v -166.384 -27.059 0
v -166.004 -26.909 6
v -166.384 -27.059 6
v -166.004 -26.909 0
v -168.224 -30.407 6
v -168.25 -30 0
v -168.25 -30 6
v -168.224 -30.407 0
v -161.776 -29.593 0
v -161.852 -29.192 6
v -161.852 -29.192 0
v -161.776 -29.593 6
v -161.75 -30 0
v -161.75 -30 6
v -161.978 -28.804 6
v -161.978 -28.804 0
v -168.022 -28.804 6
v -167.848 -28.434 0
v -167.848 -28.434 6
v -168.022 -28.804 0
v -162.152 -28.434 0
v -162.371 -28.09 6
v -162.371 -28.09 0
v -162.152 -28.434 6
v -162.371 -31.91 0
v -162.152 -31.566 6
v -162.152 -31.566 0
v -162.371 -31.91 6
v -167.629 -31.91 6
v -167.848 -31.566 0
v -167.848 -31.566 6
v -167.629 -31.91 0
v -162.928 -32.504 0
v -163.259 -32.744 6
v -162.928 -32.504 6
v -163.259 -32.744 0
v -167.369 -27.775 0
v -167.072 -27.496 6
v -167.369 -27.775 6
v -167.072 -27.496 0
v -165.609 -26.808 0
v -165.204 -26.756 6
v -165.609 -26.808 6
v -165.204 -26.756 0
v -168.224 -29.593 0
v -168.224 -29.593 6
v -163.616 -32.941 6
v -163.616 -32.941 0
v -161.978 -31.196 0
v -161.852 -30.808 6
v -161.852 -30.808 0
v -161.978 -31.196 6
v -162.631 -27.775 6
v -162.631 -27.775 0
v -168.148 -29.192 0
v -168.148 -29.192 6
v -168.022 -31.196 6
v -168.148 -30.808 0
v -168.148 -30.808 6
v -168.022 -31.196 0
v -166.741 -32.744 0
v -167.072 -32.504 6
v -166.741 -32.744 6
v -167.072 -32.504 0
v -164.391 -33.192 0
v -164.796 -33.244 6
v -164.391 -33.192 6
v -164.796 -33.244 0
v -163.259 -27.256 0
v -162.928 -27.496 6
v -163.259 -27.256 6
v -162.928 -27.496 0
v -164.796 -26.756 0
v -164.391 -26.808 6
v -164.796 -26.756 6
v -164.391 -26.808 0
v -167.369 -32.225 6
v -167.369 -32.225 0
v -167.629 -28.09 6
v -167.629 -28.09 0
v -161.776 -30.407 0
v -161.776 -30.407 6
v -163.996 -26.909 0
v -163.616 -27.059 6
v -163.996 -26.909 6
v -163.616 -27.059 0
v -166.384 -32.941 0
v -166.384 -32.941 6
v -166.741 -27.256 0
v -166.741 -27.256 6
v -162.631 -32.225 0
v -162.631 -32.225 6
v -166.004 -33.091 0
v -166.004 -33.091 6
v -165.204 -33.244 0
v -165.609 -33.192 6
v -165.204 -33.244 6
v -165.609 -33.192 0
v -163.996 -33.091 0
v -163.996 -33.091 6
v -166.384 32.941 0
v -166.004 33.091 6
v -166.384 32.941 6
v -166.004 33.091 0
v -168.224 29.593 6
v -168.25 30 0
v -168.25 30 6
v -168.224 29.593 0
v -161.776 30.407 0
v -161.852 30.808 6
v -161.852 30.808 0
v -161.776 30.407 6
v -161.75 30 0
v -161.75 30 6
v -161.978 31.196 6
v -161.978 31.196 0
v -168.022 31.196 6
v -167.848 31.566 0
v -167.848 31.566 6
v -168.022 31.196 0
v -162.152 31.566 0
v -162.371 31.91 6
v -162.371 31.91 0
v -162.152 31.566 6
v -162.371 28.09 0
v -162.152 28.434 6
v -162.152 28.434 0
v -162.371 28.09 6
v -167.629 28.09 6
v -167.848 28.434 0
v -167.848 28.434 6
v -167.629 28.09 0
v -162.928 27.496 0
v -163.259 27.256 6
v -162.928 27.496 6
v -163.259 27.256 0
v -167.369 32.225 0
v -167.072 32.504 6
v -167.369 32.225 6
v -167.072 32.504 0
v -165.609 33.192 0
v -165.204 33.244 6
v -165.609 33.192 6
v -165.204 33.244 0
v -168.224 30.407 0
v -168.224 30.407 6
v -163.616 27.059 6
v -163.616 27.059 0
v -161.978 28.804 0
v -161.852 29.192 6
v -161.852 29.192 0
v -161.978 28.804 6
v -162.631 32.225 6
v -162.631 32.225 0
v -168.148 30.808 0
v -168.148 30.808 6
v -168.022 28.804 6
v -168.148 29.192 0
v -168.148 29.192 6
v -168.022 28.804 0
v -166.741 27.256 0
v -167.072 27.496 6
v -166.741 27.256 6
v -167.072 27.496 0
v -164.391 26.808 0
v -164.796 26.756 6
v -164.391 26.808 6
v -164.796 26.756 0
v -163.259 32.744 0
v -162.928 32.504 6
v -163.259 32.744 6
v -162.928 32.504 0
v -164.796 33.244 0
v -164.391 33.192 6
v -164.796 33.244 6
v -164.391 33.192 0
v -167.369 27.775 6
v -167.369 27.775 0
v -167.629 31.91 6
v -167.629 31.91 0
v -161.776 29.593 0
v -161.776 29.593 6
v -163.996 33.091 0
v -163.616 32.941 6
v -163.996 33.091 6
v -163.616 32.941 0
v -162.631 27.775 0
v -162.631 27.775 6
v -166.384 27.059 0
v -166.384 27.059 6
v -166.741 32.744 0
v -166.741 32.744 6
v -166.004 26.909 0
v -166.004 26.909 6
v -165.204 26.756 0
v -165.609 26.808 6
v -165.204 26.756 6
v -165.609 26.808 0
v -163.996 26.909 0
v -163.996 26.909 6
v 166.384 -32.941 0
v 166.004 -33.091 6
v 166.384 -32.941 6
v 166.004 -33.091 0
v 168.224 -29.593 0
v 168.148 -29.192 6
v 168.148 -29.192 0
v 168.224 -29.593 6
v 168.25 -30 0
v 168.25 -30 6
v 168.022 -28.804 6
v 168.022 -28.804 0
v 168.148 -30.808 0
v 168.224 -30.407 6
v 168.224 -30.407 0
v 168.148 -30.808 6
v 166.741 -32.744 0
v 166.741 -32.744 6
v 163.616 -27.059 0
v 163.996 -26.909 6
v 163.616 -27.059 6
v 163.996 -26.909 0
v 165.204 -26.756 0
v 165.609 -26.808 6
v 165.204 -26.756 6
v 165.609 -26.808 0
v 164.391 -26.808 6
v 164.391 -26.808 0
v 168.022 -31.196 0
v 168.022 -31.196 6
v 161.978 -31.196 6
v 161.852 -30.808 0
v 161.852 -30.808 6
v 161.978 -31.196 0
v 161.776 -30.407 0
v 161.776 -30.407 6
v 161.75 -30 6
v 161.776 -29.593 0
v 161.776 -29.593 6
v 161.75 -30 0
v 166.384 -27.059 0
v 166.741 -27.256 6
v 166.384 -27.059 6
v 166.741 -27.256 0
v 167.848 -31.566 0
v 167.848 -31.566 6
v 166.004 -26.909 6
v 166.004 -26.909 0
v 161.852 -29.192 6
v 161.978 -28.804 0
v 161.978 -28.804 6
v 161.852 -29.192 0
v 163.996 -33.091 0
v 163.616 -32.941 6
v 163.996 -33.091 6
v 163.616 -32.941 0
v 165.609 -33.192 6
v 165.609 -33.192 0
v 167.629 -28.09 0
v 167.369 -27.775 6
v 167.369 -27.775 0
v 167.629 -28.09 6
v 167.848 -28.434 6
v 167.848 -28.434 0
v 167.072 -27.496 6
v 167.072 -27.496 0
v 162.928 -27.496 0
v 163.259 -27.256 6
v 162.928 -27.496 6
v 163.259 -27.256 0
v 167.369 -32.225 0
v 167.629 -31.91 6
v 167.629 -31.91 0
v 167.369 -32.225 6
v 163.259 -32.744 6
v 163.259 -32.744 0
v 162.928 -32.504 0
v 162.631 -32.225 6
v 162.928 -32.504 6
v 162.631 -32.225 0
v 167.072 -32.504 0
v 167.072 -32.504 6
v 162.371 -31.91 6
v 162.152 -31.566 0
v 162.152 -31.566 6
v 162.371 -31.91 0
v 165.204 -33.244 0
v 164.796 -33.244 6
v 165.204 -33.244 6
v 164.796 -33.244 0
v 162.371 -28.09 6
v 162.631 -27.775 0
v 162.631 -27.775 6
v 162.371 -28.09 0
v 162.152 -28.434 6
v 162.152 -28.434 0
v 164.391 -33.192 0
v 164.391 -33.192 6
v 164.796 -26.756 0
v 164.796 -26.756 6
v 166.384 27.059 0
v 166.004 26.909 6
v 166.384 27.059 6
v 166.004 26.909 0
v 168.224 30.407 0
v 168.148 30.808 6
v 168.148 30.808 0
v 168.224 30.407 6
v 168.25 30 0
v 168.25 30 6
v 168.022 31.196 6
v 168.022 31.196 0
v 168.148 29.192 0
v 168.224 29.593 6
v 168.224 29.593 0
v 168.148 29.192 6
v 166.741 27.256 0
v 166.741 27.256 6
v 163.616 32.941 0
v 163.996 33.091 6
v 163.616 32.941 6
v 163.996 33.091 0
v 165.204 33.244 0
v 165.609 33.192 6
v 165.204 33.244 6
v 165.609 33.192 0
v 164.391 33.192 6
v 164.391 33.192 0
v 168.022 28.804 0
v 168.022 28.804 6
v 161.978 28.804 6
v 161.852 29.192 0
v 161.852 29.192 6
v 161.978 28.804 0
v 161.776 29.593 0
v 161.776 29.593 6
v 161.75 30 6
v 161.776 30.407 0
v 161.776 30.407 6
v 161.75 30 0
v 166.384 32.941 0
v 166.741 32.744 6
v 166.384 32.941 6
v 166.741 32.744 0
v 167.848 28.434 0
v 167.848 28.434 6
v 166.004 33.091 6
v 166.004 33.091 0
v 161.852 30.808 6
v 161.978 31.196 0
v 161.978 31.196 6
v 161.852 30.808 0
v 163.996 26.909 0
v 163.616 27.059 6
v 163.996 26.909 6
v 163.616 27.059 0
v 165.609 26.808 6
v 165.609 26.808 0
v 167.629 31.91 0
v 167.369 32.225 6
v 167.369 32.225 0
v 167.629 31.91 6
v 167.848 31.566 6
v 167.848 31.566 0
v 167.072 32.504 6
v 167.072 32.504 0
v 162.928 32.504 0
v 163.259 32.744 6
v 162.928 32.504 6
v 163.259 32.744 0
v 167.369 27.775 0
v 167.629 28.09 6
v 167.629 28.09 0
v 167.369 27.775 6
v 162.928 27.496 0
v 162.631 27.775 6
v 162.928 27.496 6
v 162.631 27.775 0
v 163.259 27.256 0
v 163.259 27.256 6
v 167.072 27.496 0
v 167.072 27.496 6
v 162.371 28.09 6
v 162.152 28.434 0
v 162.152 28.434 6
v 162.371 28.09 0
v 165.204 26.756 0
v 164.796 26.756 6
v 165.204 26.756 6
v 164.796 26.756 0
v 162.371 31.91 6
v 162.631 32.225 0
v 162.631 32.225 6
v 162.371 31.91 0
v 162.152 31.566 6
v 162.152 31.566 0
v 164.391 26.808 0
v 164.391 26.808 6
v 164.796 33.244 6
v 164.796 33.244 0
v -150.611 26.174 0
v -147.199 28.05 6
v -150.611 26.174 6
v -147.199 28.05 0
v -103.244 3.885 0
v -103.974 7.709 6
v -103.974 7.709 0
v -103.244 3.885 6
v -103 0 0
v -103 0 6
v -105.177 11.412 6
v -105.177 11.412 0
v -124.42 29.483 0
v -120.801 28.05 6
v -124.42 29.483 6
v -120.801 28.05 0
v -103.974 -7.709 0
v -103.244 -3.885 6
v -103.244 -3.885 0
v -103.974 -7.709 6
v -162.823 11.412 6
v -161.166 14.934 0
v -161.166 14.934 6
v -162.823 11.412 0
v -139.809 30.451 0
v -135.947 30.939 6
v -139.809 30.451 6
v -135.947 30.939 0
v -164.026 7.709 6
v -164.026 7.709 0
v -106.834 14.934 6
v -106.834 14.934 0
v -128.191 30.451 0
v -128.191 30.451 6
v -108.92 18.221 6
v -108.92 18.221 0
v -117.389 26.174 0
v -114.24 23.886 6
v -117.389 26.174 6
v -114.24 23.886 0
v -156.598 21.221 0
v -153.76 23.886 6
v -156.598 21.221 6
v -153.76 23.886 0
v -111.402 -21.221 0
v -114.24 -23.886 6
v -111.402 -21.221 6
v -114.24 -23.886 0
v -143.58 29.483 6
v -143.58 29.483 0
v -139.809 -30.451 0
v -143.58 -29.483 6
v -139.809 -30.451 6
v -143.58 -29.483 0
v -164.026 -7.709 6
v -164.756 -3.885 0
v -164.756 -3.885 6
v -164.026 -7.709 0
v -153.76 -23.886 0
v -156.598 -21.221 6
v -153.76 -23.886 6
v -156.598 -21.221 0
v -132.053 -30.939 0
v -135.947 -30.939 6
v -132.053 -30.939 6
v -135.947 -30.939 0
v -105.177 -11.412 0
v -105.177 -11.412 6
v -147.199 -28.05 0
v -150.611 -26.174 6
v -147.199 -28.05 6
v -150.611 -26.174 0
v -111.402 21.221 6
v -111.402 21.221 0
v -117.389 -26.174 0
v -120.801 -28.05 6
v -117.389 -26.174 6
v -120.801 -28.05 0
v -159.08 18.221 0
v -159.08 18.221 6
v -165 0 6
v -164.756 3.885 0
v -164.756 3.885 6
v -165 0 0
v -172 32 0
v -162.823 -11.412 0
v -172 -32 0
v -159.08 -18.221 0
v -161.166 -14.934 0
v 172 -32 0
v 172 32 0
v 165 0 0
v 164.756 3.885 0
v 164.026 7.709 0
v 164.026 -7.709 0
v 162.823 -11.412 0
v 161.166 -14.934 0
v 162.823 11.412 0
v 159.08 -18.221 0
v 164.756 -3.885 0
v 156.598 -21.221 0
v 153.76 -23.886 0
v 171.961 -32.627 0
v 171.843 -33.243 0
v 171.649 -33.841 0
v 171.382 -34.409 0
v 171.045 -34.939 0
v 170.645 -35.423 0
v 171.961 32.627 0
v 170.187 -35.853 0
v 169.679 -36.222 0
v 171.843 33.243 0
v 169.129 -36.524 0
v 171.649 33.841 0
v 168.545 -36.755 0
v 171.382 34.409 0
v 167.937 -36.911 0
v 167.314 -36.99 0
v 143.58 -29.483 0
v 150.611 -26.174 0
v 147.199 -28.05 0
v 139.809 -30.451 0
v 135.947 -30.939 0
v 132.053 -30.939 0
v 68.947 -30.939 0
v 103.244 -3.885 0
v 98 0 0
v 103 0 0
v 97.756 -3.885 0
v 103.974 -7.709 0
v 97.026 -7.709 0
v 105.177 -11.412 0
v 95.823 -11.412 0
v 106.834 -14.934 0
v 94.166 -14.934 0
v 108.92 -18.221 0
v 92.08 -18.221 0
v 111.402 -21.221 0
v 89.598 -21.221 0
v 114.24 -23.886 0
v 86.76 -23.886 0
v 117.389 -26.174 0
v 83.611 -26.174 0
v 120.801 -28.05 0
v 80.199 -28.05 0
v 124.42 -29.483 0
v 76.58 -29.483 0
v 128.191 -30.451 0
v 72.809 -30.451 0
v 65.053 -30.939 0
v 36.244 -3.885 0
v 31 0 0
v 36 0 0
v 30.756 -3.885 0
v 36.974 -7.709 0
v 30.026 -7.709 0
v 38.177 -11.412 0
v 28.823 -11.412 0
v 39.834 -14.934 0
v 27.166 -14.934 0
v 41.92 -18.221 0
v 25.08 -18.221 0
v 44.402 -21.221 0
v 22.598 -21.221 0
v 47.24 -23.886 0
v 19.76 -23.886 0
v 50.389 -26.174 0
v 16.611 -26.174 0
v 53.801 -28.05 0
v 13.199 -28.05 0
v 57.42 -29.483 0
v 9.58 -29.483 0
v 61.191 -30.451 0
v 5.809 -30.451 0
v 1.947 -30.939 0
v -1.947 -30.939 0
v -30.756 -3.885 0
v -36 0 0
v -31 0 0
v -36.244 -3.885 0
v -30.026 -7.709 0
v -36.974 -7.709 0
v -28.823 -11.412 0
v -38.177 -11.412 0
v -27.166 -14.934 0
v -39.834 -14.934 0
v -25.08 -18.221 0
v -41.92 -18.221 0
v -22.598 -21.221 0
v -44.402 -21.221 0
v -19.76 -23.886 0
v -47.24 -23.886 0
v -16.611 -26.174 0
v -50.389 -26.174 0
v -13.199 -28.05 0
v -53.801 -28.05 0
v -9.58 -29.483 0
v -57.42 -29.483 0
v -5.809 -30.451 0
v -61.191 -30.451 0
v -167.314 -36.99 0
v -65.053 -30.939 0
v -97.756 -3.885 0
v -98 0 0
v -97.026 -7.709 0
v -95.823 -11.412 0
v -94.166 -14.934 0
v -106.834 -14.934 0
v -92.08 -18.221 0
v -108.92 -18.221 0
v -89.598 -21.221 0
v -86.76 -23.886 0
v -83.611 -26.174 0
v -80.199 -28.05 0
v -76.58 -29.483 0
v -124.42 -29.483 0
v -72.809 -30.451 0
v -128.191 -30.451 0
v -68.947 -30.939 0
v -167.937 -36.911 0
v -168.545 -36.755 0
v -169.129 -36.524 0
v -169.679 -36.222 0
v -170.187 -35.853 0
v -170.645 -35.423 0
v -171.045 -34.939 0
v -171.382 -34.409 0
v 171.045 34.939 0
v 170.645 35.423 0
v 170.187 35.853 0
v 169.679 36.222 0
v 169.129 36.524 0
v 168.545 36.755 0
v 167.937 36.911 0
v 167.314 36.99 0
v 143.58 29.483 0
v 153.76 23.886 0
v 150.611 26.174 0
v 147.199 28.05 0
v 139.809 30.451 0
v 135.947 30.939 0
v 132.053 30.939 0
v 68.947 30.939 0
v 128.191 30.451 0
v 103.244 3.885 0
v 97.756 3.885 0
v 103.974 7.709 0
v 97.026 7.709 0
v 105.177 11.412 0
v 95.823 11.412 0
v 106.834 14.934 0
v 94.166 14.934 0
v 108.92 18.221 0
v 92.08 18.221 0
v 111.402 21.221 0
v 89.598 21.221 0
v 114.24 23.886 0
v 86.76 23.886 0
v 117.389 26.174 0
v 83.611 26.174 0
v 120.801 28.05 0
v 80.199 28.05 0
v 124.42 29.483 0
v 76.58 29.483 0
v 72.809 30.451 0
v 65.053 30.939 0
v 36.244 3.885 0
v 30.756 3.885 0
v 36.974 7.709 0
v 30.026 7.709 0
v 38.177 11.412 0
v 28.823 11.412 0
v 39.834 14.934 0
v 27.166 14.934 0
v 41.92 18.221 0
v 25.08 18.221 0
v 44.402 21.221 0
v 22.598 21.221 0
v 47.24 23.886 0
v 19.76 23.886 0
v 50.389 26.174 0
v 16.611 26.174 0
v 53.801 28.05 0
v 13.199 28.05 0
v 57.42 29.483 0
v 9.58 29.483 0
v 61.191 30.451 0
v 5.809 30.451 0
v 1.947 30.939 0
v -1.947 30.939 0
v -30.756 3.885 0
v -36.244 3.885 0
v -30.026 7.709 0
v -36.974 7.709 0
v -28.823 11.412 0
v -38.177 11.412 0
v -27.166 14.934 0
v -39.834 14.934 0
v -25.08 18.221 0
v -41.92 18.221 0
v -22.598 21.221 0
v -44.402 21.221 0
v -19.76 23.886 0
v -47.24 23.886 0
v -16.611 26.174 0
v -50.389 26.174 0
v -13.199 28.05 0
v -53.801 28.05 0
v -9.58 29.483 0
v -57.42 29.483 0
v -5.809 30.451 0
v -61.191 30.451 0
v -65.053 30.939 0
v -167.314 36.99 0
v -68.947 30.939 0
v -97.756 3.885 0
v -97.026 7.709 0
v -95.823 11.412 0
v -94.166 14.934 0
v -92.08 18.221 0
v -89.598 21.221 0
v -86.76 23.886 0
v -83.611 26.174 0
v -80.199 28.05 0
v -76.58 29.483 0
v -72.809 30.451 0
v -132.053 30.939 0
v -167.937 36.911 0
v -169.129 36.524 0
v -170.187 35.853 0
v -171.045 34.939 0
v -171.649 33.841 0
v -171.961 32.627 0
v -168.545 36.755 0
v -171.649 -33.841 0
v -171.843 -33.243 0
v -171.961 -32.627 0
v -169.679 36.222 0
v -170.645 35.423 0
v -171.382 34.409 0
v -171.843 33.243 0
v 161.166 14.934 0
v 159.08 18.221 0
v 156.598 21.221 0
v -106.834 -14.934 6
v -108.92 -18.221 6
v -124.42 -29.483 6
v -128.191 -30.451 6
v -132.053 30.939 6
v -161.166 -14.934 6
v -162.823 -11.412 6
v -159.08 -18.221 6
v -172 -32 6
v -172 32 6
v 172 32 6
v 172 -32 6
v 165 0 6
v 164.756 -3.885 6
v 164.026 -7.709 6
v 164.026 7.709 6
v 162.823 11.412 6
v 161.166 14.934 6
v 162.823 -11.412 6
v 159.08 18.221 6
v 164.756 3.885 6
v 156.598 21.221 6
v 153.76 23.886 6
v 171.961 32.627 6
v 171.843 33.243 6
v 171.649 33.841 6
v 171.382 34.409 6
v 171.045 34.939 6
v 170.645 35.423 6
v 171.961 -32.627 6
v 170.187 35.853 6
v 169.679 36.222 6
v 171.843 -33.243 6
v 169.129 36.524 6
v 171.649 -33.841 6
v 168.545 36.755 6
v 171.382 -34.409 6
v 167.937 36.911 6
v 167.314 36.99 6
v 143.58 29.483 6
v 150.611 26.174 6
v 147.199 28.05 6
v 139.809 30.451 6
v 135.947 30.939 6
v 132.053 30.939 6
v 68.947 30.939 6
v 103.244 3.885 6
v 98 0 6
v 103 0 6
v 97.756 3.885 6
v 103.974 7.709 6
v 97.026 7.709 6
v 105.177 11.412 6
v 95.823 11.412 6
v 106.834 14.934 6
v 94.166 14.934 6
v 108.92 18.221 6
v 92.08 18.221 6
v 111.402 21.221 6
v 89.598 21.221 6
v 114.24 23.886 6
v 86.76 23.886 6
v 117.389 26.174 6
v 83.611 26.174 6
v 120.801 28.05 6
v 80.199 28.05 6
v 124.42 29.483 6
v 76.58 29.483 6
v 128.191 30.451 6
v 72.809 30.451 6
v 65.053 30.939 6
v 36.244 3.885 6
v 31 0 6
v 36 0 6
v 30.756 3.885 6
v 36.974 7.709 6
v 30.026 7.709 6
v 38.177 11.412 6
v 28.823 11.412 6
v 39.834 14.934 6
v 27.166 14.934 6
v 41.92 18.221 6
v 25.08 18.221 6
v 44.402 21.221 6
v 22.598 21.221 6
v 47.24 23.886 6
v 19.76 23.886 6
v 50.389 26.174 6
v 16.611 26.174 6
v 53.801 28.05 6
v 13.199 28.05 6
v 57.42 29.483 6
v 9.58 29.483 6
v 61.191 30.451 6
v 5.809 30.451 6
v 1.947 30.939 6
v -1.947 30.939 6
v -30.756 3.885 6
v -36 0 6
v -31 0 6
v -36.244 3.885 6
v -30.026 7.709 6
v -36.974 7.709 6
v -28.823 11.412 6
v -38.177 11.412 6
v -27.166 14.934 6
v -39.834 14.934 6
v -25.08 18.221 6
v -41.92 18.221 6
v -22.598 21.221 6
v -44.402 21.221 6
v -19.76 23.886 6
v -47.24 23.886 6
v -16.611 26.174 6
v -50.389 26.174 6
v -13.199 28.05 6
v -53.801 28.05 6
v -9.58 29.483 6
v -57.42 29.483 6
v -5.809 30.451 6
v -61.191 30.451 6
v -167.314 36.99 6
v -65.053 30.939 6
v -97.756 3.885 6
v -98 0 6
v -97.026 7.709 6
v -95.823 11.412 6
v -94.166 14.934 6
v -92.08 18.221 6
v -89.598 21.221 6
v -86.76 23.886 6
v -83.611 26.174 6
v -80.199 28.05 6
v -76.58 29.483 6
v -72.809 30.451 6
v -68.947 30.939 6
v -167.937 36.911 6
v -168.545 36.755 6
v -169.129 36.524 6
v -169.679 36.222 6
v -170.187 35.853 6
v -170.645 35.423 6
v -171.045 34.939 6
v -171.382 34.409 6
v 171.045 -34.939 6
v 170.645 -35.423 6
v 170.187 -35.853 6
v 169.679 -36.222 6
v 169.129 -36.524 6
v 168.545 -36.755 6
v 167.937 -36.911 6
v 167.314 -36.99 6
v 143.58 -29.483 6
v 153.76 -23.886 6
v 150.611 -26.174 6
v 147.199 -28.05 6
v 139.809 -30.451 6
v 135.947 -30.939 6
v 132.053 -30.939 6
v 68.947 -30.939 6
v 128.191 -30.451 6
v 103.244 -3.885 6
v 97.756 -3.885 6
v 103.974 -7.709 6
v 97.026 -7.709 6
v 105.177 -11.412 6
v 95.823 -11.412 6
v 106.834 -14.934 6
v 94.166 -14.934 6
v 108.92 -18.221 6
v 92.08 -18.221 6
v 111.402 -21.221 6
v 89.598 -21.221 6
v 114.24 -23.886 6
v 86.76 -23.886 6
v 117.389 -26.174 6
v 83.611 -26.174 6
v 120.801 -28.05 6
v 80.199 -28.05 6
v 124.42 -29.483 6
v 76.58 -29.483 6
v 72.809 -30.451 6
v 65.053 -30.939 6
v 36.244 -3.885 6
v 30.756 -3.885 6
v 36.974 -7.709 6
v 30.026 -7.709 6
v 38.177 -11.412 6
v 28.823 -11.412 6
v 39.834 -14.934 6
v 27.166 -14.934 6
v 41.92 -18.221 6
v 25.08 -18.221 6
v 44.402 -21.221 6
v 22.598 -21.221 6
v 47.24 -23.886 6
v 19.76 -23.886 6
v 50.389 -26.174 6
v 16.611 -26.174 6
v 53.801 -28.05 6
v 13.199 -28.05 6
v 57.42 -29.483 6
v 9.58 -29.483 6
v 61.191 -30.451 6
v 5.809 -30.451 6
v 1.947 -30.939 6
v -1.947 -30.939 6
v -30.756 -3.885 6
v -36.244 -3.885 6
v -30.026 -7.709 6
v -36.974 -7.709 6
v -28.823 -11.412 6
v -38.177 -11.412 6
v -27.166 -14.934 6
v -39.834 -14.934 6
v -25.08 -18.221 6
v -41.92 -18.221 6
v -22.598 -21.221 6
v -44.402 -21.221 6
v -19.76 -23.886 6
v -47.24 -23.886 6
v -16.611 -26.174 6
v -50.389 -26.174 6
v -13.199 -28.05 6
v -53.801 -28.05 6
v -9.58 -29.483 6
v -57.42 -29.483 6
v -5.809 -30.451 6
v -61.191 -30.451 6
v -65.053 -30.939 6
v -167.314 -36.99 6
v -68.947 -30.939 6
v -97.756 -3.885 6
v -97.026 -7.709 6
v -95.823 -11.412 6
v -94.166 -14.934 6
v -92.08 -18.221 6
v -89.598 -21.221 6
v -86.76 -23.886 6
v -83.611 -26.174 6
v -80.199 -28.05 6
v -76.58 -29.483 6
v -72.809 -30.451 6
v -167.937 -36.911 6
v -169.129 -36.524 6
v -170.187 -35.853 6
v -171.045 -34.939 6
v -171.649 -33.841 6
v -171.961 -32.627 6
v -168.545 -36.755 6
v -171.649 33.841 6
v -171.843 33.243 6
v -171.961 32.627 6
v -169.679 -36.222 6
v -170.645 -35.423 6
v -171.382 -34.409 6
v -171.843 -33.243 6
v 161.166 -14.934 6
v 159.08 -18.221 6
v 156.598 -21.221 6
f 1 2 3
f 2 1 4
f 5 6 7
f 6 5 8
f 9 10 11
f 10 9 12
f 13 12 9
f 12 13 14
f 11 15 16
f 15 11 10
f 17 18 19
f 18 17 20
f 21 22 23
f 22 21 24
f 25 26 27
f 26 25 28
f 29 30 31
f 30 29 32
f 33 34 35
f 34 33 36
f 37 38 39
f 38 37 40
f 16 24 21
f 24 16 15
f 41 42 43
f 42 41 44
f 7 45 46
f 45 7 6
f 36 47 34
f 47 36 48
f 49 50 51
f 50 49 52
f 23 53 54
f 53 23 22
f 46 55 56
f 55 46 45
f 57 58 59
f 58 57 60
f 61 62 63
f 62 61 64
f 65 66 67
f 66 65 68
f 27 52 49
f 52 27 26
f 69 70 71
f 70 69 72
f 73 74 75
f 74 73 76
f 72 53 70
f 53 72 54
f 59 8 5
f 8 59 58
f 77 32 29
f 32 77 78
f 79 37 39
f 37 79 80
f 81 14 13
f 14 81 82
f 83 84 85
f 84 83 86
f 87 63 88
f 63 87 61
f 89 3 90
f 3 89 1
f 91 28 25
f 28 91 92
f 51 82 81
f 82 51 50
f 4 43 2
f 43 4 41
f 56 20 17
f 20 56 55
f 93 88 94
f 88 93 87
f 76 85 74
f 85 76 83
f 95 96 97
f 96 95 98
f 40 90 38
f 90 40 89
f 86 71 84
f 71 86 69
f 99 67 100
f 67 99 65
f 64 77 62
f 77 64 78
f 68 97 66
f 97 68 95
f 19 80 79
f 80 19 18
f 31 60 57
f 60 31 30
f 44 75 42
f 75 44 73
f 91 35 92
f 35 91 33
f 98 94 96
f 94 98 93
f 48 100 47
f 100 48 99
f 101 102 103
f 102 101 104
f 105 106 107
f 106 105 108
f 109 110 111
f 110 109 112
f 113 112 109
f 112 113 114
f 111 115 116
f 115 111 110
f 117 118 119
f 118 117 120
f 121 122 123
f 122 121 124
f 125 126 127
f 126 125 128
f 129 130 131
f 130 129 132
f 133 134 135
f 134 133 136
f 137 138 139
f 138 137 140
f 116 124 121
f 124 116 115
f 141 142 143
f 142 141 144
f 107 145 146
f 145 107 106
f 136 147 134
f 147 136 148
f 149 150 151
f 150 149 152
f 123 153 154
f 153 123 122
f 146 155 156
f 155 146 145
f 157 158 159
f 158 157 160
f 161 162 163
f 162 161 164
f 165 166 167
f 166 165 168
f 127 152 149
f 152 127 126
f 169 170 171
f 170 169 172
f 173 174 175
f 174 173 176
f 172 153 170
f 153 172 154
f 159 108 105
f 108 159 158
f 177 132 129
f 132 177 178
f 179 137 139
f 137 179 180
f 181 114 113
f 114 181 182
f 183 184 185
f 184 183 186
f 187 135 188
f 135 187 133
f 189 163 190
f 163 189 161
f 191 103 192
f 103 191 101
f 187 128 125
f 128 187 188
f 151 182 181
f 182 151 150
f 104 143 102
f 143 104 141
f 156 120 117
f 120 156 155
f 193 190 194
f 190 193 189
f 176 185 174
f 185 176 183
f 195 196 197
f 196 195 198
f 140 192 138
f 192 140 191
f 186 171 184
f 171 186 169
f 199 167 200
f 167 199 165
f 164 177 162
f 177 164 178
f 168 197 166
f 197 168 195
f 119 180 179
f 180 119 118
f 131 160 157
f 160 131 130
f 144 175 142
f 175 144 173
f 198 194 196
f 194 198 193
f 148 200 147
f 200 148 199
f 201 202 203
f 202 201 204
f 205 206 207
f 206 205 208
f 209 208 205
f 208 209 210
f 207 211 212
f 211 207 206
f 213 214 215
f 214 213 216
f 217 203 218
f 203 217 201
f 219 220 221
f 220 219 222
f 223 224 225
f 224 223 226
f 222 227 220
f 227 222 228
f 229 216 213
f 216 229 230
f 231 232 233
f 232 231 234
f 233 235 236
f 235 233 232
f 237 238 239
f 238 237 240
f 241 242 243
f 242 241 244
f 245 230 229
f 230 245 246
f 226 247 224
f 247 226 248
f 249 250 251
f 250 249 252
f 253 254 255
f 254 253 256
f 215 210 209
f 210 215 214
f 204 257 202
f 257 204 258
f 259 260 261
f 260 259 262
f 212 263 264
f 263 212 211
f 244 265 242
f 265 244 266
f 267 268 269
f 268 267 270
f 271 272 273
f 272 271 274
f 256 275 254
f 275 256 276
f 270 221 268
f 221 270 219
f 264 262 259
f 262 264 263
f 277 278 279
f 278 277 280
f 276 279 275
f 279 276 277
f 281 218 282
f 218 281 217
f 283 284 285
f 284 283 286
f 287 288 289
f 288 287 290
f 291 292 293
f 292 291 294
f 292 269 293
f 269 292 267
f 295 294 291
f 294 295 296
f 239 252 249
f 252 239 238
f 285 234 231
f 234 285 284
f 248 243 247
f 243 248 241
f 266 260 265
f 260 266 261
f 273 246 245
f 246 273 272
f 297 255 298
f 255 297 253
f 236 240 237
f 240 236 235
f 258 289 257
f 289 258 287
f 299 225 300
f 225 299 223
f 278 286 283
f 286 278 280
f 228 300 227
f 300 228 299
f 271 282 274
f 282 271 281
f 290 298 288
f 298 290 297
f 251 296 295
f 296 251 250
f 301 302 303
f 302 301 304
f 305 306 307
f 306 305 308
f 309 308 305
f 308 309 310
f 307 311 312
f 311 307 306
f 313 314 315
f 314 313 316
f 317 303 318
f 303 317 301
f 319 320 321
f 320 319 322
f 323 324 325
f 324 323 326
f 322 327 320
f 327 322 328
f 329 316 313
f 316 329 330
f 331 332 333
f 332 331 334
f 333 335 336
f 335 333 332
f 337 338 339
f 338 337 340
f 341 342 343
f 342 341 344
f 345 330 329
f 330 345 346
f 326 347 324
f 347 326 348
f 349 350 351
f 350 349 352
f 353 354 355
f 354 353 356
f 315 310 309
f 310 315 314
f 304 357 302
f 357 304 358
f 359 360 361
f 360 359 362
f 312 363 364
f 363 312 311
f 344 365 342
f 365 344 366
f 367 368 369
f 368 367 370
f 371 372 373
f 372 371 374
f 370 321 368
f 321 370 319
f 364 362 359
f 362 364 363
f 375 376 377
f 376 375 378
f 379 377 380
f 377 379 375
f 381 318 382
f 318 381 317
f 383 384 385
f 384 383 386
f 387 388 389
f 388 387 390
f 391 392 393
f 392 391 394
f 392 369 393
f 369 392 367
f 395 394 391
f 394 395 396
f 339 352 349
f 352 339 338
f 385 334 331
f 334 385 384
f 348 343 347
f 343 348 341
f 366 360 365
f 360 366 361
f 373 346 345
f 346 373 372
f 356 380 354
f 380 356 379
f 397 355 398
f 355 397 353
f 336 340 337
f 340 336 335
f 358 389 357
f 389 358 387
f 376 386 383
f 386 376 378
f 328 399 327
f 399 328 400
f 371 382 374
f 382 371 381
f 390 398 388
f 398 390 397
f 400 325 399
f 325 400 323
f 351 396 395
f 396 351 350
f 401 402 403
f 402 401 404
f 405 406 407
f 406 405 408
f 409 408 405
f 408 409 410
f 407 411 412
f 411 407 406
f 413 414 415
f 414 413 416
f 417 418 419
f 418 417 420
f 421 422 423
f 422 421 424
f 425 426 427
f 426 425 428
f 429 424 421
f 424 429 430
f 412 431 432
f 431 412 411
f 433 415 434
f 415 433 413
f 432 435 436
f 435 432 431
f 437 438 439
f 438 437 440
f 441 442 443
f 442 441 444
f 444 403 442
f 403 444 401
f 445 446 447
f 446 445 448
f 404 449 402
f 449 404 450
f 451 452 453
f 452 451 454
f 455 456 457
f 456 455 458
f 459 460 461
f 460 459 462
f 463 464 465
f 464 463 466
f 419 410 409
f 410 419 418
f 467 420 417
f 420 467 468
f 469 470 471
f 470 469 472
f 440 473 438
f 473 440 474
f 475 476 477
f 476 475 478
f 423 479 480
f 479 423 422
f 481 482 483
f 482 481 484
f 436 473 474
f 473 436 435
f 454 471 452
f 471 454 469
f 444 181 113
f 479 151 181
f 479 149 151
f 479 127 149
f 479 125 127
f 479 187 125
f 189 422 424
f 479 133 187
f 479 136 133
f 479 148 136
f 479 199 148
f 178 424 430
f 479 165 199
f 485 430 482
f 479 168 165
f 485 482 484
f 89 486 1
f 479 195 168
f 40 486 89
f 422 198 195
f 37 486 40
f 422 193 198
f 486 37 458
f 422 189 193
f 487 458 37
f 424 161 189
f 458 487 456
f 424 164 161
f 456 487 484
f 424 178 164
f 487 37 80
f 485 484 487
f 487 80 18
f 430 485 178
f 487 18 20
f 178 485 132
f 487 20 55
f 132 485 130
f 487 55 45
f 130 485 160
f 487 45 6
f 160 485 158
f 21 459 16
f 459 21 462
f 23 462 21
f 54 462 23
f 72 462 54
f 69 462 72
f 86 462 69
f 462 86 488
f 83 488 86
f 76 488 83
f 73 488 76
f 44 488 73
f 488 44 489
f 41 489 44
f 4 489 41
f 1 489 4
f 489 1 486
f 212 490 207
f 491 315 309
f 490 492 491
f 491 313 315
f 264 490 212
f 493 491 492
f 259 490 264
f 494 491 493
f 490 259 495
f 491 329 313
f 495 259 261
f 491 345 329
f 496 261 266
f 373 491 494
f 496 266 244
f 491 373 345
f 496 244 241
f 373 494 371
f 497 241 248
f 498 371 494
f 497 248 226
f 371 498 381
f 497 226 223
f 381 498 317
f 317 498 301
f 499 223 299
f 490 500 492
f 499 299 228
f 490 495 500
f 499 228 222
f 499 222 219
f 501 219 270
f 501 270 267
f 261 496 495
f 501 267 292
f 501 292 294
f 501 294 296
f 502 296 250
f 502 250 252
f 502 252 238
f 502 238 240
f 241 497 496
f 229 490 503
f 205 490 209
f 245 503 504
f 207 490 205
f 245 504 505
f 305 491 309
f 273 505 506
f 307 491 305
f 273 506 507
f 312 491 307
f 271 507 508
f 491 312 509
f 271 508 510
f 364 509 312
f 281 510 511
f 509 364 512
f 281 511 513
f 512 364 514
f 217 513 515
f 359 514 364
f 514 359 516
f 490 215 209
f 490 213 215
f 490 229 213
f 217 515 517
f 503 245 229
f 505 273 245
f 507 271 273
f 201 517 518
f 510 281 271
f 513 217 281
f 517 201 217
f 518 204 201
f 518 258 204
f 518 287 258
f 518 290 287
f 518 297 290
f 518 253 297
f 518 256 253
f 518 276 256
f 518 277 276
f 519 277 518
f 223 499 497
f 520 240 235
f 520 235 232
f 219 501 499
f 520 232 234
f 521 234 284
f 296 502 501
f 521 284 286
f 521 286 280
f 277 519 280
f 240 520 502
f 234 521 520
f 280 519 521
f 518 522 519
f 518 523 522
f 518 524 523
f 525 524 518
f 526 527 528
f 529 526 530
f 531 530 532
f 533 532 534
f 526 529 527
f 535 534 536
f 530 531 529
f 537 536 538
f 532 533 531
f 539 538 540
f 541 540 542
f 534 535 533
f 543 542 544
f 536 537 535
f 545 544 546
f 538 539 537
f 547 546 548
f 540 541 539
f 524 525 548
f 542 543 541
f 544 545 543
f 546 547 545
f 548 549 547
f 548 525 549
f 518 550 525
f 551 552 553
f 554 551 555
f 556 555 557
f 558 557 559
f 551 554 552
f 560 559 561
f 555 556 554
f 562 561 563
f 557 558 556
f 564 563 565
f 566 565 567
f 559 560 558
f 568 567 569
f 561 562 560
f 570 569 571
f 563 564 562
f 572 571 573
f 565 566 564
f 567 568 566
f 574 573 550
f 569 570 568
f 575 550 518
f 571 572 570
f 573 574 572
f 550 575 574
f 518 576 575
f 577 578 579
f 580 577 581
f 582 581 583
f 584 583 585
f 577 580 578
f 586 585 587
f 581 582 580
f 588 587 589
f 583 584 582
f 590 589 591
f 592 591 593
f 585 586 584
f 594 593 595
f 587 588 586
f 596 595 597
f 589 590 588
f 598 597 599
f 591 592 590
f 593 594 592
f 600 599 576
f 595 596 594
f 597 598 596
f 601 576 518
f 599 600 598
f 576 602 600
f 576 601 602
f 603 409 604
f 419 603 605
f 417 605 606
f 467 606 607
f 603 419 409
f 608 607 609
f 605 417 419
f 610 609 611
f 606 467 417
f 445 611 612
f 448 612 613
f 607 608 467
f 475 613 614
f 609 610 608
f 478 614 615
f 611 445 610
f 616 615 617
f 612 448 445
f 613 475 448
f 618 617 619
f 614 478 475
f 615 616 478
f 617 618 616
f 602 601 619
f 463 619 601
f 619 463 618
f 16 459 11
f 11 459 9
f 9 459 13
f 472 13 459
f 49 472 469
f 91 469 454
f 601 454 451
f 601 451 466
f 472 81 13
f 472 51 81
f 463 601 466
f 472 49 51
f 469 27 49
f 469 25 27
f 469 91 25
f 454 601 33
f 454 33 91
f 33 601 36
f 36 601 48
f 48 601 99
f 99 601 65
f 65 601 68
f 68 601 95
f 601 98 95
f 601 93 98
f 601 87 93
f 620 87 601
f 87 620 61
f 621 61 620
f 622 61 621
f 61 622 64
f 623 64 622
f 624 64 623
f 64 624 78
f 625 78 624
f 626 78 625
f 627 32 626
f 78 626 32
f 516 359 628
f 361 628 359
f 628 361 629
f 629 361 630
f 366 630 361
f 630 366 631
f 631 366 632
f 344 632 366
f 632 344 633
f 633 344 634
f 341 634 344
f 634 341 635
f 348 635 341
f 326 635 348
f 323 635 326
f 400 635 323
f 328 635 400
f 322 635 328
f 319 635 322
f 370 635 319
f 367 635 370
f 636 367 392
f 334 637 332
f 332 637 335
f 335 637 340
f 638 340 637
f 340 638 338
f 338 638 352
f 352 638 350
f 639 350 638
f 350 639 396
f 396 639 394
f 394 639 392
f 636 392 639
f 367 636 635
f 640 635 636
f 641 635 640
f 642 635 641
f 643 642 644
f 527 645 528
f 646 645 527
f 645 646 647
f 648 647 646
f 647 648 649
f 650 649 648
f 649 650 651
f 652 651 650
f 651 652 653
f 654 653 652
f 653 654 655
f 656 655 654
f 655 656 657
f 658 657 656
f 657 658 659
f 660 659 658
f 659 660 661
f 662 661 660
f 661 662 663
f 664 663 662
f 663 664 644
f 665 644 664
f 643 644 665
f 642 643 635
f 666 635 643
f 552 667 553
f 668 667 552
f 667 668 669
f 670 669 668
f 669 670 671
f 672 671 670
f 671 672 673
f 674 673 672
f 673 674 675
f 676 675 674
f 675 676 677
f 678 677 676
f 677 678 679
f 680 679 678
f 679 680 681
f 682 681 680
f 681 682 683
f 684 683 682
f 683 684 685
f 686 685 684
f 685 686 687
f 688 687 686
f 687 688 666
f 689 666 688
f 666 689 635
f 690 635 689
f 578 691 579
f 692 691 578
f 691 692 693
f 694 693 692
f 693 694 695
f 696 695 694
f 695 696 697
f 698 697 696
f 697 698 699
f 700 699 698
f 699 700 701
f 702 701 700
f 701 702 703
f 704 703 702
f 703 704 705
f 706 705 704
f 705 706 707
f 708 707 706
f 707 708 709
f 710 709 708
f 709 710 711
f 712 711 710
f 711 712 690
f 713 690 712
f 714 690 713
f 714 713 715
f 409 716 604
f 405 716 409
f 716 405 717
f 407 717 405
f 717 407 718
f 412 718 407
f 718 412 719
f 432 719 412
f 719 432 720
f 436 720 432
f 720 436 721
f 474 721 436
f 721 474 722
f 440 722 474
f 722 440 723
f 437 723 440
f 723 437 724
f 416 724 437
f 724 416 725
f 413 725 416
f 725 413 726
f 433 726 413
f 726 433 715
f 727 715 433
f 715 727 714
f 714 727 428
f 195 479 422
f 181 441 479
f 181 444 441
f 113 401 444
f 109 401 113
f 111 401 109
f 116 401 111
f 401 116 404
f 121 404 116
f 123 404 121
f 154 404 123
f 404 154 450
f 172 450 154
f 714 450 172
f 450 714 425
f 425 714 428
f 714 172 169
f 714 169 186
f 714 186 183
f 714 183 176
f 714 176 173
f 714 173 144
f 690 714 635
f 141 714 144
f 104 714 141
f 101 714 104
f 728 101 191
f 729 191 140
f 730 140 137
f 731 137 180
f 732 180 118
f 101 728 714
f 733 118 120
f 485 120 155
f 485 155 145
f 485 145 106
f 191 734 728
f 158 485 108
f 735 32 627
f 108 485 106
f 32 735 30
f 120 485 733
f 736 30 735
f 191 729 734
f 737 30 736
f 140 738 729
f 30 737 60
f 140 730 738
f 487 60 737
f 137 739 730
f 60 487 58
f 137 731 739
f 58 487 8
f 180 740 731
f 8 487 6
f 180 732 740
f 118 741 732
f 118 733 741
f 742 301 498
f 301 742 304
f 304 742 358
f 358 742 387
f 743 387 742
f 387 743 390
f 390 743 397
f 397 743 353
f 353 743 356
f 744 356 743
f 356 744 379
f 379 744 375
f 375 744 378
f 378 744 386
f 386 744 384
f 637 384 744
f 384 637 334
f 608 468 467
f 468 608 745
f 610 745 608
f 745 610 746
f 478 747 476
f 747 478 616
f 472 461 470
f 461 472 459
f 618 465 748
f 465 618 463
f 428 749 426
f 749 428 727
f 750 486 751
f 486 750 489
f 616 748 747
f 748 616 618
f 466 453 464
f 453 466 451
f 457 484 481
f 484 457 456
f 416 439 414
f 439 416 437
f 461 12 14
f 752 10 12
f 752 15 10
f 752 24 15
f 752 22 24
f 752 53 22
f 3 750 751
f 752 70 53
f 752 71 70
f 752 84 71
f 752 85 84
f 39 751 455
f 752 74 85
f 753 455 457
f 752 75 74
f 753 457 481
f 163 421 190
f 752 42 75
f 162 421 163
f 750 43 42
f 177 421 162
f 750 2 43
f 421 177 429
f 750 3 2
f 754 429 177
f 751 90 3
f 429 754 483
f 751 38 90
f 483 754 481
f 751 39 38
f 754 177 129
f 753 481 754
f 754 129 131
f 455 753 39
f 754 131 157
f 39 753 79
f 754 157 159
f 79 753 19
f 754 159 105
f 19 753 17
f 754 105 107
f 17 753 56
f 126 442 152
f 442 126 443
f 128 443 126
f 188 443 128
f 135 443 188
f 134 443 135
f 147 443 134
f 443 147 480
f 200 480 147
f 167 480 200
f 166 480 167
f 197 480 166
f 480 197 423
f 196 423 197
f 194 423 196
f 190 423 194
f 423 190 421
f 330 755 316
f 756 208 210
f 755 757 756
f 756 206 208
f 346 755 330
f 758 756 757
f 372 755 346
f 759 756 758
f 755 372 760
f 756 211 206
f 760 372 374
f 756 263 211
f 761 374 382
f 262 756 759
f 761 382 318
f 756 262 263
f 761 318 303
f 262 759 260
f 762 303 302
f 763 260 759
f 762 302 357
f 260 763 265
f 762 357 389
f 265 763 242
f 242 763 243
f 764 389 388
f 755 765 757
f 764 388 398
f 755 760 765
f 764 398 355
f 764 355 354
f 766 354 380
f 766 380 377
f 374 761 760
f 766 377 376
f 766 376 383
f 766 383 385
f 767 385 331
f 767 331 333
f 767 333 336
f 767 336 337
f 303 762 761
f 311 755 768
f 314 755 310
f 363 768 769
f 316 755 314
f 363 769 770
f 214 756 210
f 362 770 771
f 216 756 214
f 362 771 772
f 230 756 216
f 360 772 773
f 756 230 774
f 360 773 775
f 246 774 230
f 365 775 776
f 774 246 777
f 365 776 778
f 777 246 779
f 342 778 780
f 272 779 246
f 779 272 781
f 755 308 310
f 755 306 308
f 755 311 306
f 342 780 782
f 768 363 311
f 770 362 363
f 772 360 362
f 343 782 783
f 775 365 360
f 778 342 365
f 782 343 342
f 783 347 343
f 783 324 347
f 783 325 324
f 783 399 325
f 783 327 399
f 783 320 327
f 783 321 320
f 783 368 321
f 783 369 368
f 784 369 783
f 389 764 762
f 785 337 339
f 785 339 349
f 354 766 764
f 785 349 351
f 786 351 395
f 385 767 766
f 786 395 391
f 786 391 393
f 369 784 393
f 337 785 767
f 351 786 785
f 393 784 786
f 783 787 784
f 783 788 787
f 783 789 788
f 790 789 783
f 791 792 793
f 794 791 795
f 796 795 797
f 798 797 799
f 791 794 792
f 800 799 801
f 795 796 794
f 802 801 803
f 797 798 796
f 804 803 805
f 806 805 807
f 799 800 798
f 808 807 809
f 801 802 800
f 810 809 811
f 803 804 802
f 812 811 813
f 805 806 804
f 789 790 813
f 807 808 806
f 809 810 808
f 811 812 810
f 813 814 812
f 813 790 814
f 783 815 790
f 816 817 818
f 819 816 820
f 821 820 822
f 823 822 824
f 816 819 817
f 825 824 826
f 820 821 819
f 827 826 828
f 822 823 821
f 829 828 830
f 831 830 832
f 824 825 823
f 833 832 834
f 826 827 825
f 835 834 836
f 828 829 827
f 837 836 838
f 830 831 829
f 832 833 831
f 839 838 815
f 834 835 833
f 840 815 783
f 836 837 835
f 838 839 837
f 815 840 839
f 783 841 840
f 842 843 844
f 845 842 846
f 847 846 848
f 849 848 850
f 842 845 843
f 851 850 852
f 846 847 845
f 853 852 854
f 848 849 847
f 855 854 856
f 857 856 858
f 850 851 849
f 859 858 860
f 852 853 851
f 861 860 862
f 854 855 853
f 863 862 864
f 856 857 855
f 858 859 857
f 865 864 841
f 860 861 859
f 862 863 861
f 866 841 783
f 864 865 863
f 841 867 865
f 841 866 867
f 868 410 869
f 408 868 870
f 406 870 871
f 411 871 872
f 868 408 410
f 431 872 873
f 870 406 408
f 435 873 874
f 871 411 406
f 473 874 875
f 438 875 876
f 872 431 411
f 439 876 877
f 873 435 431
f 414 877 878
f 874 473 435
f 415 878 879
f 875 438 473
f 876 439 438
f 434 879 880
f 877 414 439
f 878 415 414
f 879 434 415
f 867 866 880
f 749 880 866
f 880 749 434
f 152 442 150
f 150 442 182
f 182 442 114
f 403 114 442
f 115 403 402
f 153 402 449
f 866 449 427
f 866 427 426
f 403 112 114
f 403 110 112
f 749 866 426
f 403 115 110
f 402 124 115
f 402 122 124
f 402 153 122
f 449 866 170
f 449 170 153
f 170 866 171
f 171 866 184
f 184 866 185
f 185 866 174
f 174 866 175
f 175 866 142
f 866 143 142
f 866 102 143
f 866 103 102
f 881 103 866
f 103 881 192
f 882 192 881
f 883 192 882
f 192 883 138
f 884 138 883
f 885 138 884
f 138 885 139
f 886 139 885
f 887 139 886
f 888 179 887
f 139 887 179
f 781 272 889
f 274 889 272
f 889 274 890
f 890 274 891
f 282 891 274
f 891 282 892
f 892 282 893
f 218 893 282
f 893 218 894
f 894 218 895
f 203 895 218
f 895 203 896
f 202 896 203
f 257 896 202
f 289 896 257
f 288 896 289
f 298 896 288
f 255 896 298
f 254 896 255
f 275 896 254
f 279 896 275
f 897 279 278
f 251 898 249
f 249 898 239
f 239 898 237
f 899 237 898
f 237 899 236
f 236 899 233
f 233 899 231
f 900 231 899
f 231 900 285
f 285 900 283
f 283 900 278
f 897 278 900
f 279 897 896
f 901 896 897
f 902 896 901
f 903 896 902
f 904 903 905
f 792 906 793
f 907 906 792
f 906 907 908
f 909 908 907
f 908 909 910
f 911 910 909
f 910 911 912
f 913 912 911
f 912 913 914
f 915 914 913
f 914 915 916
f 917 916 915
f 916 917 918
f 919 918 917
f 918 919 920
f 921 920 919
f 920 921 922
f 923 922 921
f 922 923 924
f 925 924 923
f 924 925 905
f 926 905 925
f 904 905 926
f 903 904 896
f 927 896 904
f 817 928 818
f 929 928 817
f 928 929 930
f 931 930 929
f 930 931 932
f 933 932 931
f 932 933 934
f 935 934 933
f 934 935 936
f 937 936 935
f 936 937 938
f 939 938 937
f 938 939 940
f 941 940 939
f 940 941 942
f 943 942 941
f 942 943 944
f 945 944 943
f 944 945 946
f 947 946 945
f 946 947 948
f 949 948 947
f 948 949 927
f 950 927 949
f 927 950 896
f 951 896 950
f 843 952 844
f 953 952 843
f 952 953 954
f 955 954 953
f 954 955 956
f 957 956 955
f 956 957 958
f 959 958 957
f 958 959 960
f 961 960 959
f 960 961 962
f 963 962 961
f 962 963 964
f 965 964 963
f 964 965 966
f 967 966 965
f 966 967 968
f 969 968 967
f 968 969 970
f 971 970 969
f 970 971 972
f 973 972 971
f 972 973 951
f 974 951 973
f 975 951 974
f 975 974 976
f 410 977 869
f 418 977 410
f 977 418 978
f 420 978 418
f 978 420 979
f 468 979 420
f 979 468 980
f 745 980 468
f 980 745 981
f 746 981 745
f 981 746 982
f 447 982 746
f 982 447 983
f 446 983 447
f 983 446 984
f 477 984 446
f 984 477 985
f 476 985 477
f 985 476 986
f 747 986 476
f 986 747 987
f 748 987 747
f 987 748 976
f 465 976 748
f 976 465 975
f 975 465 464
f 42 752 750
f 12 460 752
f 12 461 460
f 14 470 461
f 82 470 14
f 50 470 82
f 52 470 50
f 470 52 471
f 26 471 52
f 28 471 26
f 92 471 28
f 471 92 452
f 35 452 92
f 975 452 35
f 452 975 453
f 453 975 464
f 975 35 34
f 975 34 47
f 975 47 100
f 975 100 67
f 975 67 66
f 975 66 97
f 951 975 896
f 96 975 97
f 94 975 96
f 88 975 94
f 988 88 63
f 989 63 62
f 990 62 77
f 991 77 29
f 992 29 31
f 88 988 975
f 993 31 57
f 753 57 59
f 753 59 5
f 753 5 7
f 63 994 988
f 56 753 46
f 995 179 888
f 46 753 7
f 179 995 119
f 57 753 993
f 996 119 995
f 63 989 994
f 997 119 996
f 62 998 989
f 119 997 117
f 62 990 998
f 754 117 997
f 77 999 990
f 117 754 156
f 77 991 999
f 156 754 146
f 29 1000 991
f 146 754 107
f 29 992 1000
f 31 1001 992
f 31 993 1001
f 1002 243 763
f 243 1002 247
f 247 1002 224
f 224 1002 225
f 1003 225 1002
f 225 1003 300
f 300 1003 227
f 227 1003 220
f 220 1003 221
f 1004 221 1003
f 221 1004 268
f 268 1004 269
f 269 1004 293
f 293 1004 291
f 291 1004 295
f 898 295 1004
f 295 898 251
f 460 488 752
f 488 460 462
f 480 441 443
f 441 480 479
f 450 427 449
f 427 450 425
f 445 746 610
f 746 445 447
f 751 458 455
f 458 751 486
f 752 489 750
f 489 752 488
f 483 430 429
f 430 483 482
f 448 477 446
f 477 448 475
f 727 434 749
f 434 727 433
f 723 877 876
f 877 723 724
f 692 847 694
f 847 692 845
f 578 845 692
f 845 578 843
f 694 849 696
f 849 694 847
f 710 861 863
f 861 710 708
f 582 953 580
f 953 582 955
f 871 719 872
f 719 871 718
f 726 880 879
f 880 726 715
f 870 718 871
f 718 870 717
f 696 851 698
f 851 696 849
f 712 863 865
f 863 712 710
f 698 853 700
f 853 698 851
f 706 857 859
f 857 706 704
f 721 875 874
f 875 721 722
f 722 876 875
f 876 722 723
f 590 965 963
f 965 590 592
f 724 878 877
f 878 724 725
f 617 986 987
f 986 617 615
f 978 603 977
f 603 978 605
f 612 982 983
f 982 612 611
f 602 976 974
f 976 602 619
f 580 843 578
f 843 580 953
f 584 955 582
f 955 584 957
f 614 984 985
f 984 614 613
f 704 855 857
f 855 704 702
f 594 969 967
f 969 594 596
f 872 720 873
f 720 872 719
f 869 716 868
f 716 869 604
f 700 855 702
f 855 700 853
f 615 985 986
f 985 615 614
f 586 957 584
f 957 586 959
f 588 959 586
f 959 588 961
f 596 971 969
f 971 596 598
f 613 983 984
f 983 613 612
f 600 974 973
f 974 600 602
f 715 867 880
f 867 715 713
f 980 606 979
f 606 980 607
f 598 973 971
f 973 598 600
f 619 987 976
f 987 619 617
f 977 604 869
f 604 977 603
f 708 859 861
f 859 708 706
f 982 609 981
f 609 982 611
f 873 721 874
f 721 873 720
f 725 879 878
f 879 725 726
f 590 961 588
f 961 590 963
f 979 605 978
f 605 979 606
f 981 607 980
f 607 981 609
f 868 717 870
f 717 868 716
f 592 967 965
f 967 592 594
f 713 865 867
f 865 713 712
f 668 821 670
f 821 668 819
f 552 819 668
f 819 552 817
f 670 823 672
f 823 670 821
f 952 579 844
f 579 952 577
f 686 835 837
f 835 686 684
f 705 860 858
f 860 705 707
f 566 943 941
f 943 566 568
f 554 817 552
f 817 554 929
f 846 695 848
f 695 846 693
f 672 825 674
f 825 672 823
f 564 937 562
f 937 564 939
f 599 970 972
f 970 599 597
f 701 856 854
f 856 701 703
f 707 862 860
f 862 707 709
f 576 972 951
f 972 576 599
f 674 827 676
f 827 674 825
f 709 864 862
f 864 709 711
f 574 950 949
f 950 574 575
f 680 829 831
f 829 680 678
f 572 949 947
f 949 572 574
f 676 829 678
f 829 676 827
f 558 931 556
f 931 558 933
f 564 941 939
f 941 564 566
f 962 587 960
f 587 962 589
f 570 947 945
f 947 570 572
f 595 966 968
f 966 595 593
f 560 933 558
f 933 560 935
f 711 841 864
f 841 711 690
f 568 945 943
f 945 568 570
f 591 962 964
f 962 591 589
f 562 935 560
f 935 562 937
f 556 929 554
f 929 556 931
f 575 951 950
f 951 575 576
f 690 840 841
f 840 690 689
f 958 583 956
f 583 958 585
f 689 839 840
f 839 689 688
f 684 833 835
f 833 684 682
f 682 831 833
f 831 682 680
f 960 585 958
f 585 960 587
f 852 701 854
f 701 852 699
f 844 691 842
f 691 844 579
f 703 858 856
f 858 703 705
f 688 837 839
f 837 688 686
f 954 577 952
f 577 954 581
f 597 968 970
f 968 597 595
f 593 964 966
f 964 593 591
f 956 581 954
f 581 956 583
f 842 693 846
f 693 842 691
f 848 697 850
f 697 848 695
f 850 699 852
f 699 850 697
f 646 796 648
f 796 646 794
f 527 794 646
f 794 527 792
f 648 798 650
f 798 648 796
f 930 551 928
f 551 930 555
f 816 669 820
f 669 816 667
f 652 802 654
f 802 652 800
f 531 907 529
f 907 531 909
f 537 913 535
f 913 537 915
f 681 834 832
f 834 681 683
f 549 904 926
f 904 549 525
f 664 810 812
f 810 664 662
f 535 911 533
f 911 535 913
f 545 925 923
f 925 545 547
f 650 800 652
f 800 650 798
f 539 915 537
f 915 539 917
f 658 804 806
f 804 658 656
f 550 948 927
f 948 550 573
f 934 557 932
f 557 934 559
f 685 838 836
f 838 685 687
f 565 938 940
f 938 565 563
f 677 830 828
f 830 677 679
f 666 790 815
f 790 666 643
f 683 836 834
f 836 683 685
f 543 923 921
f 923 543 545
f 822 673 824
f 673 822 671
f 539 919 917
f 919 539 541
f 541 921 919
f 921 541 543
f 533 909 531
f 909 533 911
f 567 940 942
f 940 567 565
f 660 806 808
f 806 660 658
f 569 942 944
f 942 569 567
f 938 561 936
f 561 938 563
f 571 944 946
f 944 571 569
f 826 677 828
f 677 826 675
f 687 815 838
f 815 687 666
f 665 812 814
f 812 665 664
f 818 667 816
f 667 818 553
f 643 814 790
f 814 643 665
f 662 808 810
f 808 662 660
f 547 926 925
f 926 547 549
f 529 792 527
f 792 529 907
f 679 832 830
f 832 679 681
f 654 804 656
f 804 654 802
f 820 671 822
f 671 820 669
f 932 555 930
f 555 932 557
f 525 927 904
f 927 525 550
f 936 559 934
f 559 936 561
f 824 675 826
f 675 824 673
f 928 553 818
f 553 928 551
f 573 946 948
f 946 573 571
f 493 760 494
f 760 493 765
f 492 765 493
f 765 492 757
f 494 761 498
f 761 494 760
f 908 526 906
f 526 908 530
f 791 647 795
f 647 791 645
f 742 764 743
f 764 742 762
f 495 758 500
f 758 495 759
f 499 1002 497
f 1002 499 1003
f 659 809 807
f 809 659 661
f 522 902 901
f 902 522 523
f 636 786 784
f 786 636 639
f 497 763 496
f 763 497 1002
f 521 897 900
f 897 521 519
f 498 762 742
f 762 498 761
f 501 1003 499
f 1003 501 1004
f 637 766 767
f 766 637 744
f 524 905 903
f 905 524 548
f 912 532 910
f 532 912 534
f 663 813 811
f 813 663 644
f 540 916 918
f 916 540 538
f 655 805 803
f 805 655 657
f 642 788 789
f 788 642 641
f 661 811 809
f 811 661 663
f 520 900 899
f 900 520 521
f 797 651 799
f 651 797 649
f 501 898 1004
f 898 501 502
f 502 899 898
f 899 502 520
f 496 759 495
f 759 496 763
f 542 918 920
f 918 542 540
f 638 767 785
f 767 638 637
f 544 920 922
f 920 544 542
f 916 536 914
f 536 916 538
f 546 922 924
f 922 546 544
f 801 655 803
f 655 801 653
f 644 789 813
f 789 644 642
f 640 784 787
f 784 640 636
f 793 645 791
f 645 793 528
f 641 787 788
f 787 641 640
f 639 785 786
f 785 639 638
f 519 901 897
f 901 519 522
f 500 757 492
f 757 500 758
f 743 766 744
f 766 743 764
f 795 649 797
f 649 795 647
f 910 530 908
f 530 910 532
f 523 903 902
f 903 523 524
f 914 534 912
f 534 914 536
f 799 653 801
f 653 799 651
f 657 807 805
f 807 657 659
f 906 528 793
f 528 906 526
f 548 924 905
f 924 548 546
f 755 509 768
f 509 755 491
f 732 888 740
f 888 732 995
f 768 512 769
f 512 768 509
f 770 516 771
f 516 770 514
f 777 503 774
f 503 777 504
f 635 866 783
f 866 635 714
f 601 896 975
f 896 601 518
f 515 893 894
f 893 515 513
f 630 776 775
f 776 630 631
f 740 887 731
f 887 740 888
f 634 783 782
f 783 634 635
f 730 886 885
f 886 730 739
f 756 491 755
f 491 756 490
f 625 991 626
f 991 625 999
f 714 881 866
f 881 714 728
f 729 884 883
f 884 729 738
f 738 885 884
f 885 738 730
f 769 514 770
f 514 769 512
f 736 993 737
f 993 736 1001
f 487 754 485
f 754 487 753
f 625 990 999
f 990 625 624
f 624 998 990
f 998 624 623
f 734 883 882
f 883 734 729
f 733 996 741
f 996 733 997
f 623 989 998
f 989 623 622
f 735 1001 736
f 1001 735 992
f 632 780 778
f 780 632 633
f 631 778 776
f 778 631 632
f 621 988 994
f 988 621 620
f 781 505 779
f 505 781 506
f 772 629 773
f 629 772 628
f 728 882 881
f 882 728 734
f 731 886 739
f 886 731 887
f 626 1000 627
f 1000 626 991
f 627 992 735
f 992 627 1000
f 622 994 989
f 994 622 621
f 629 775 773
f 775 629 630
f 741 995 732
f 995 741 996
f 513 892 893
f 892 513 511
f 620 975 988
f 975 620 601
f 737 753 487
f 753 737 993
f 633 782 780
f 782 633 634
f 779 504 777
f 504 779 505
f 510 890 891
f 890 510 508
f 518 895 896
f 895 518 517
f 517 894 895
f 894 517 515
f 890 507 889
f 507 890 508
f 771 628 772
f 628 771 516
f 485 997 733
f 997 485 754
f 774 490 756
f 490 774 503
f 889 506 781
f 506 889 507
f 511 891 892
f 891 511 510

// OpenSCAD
$fn = 50;


difference() {
	union() {
		hull() {
			translate(v = [-167.0000000000, 32.0000000000, 0]) {
				cylinder(h = 6, r = 5);
			}
			translate(v = [167.0000000000, 32.0000000000, 0]) {
				cylinder(h = 6, r = 5);
			}
			translate(v = [-167.0000000000, -32.0000000000, 0]) {
				cylinder(h = 6, r = 5);
			}
			translate(v = [167.0000000000, -32.0000000000, 0]) {
				cylinder(h = 6, r = 5);
			}
		}
	}
	union() {
		#translate(v = [-165.0000000000, -30.0000000000, -100.0000000000]) {
			cylinder(h = 200, r = 3.2500000000);
		}
		#translate(v = [-165.0000000000, 30.0000000000, -100.0000000000]) {
			cylinder(h = 200, r = 3.2500000000);
		}
		#translate(v = [165.0000000000, -30.0000000000, -100.0000000000]) {
			cylinder(h = 200, r = 3.2500000000);
		}
		#translate(v = [165.0000000000, 30.0000000000, -100.0000000000]) {
			cylinder(h = 200, r = 3.2500000000);
		}
		#translate(v = [-134.0000000000, 0, 0]) {
			cylinder(h = 6, r = 31.0000000000);
		}
		#translate(v = [-67.0000000000, 0, 0]) {
			cylinder(h = 6, r = 31.0000000000);
		}
		#cylinder(h = 6, r = 31.0000000000);
		#translate(v = [67.0000000000, 0, 0]) {
			cylinder(h = 6, r = 31.0000000000);
		}
		#translate(v = [134.0000000000, 0, 0]) {
			cylinder(h = 6, r = 31.0000000000);
		}
	}
}
